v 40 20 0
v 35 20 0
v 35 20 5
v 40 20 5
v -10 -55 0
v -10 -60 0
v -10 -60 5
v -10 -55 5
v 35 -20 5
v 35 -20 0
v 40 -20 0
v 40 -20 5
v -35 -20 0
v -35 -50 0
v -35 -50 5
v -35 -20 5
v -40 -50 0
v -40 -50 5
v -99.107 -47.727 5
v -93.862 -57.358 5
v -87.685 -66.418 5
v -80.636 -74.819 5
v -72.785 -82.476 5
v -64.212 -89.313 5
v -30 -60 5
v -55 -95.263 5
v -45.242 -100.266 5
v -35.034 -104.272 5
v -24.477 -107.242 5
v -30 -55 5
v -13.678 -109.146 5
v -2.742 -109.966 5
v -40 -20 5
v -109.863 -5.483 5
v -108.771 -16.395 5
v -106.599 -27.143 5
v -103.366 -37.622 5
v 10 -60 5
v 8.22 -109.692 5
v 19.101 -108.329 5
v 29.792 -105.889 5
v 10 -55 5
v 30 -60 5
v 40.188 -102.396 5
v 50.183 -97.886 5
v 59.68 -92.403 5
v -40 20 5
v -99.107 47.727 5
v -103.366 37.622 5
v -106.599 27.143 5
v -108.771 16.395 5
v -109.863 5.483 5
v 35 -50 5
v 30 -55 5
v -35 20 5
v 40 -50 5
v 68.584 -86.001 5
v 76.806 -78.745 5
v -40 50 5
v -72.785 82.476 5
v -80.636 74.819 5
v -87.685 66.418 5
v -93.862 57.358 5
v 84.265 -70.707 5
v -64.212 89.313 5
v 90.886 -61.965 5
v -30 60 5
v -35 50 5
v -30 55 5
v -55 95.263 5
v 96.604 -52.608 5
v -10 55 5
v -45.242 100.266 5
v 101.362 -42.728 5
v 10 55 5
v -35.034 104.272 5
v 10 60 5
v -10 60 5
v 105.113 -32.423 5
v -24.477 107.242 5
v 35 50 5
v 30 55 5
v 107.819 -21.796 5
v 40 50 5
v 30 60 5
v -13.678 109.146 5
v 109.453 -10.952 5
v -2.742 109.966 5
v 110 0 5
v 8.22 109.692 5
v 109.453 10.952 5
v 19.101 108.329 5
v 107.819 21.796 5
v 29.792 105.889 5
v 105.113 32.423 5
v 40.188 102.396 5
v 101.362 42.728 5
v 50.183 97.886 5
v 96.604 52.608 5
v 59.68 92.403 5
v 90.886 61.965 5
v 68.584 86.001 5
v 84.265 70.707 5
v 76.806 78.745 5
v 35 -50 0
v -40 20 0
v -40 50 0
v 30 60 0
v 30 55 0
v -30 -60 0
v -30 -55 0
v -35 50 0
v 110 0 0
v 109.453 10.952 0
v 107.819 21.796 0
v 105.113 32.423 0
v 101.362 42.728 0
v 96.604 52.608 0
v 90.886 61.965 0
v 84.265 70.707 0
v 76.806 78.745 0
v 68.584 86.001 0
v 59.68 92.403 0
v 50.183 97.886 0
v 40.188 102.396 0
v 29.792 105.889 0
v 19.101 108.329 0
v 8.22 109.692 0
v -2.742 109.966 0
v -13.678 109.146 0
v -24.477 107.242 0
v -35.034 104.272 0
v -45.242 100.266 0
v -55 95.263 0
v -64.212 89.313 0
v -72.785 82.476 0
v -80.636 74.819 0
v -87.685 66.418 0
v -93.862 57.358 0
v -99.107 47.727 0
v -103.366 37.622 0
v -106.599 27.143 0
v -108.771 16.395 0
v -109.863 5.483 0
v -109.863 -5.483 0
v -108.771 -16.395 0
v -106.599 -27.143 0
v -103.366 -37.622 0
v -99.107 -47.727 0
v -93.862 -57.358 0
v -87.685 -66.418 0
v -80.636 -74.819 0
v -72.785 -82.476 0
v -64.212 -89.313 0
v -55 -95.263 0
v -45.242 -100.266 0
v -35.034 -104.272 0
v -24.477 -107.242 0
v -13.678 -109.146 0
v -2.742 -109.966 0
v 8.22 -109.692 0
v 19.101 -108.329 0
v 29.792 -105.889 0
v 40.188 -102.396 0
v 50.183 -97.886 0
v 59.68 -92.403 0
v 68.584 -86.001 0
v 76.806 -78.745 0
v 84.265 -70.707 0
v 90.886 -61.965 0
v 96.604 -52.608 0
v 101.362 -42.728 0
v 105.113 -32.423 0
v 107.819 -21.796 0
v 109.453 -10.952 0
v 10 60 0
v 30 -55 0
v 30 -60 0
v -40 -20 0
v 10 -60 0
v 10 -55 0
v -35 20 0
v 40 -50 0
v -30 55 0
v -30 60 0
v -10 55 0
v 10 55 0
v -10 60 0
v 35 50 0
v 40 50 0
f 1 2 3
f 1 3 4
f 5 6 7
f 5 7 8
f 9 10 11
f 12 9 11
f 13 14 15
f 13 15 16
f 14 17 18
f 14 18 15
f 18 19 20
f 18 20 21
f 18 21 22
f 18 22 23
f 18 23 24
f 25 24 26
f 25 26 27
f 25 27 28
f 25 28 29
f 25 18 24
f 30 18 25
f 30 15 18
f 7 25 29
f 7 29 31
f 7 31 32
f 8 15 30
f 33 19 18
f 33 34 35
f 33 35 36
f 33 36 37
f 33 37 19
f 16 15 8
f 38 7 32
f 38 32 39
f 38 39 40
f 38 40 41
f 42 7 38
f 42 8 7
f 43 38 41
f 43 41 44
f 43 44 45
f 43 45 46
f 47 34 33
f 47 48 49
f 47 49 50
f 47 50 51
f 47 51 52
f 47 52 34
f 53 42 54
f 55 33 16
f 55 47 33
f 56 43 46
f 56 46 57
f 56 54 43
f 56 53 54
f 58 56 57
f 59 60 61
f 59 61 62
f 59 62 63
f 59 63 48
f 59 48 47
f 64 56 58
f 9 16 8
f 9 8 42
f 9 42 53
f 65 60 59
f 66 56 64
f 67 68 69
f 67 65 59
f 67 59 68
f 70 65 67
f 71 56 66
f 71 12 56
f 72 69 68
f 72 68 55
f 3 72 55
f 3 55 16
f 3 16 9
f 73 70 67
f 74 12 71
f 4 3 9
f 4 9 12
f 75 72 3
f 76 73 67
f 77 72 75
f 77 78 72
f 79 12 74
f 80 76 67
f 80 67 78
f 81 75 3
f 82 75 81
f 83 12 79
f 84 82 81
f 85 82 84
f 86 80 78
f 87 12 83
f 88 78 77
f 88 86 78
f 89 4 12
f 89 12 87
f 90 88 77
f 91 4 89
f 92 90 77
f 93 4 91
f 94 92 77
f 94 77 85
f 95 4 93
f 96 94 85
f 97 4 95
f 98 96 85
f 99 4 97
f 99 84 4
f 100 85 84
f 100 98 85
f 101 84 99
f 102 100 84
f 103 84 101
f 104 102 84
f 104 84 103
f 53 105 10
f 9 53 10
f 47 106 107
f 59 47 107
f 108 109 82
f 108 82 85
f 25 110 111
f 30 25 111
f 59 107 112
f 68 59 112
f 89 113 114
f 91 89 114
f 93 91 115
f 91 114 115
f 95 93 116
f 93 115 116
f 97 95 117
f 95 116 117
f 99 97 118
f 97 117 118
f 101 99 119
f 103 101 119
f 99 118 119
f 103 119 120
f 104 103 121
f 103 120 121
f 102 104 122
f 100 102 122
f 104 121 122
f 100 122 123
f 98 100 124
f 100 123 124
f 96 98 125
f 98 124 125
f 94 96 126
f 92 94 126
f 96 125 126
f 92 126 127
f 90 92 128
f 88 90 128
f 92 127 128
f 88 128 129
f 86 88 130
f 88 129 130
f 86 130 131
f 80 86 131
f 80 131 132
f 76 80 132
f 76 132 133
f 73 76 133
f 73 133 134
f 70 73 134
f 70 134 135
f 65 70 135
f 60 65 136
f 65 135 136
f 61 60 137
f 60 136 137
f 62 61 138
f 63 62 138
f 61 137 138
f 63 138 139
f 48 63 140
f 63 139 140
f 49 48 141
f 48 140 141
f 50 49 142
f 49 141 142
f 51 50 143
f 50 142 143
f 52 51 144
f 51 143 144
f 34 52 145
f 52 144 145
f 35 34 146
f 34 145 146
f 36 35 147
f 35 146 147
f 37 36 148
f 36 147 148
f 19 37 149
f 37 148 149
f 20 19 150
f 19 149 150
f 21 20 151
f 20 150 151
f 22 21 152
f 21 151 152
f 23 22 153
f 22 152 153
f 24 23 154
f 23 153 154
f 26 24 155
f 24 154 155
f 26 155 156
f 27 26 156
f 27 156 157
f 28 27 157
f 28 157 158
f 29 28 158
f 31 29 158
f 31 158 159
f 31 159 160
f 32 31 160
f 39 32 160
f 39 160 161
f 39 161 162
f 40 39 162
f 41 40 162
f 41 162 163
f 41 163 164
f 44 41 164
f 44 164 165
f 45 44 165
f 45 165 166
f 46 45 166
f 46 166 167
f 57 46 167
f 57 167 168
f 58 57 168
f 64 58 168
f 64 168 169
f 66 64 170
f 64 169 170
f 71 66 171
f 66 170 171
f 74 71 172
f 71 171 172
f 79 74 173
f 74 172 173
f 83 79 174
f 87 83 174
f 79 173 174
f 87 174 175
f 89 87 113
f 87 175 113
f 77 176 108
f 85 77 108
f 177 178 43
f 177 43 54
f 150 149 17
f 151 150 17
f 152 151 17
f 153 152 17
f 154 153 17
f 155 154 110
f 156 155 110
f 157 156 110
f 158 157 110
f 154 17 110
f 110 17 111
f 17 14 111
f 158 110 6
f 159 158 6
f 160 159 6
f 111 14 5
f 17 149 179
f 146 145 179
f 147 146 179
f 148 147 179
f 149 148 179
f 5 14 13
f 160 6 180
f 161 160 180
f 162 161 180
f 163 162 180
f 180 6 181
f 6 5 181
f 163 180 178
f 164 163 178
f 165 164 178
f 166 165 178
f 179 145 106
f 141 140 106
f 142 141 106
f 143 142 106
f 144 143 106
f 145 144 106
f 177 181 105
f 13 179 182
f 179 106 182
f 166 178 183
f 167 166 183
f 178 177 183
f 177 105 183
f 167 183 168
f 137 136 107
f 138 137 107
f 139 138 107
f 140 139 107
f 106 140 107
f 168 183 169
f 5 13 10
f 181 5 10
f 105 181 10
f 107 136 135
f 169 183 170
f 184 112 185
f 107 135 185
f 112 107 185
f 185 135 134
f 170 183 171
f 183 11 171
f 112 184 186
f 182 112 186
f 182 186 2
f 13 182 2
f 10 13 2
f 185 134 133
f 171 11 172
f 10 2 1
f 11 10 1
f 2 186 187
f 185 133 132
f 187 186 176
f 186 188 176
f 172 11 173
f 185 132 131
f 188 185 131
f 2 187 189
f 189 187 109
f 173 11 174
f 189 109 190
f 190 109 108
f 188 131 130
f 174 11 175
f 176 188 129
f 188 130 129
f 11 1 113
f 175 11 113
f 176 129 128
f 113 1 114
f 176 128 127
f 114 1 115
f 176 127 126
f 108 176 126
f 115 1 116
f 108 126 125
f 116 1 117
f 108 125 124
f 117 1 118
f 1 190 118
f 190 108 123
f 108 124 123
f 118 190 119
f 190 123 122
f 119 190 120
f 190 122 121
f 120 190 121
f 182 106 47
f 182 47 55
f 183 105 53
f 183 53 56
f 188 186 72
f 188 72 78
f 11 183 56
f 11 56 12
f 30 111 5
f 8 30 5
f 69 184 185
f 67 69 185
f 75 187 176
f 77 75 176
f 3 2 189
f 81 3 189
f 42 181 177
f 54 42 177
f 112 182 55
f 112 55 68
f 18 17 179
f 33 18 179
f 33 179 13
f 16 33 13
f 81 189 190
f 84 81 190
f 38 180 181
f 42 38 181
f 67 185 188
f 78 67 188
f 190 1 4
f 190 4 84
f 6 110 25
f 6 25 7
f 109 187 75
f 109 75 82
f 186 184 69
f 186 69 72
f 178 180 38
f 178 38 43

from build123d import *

# Parameters (mm, degrees)
SKETCH1_R           = 110
SKETCH1_W           = 20
SKETCH1_H           = 5
SKETCH1_W_2         = 5
SKETCH1_H_2         = 30
BOSS_EXTRUDE1_DEPTH = 5


with BuildPart() as part:
    # Sketch1 → Boss-Extrude1 (new body)
    with BuildSketch(Plane.XY):
        Circle(SKETCH1_R)
        with Locations((-20, 57.5)):
            Rectangle(SKETCH1_W, SKETCH1_H, mode=Mode.SUBTRACT)
        with Locations((20, 57.5)):
            Rectangle(SKETCH1_W, SKETCH1_H, mode=Mode.SUBTRACT)
        with Locations((37.5, 35)):
            Rectangle(SKETCH1_W_2, SKETCH1_H_2, mode=Mode.SUBTRACT)
        with Locations((37.5, -35)):
            Rectangle(SKETCH1_W_2, SKETCH1_H_2, mode=Mode.SUBTRACT)
        with Locations((20, -57.5)):
            Rectangle(SKETCH1_W, SKETCH1_H, mode=Mode.SUBTRACT)
        with Locations((-20, -57.5)):
            Rectangle(SKETCH1_W, SKETCH1_H, mode=Mode.SUBTRACT)
        with Locations((-37.5, -35)):
            Rectangle(SKETCH1_W_2, SKETCH1_H_2, mode=Mode.SUBTRACT)
        with Locations((-37.5, 35)):
            Rectangle(SKETCH1_W_2, SKETCH1_H_2, mode=Mode.SUBTRACT)
    extrude(amount=BOSS_EXTRUDE1_DEPTH)


solid = part.part
